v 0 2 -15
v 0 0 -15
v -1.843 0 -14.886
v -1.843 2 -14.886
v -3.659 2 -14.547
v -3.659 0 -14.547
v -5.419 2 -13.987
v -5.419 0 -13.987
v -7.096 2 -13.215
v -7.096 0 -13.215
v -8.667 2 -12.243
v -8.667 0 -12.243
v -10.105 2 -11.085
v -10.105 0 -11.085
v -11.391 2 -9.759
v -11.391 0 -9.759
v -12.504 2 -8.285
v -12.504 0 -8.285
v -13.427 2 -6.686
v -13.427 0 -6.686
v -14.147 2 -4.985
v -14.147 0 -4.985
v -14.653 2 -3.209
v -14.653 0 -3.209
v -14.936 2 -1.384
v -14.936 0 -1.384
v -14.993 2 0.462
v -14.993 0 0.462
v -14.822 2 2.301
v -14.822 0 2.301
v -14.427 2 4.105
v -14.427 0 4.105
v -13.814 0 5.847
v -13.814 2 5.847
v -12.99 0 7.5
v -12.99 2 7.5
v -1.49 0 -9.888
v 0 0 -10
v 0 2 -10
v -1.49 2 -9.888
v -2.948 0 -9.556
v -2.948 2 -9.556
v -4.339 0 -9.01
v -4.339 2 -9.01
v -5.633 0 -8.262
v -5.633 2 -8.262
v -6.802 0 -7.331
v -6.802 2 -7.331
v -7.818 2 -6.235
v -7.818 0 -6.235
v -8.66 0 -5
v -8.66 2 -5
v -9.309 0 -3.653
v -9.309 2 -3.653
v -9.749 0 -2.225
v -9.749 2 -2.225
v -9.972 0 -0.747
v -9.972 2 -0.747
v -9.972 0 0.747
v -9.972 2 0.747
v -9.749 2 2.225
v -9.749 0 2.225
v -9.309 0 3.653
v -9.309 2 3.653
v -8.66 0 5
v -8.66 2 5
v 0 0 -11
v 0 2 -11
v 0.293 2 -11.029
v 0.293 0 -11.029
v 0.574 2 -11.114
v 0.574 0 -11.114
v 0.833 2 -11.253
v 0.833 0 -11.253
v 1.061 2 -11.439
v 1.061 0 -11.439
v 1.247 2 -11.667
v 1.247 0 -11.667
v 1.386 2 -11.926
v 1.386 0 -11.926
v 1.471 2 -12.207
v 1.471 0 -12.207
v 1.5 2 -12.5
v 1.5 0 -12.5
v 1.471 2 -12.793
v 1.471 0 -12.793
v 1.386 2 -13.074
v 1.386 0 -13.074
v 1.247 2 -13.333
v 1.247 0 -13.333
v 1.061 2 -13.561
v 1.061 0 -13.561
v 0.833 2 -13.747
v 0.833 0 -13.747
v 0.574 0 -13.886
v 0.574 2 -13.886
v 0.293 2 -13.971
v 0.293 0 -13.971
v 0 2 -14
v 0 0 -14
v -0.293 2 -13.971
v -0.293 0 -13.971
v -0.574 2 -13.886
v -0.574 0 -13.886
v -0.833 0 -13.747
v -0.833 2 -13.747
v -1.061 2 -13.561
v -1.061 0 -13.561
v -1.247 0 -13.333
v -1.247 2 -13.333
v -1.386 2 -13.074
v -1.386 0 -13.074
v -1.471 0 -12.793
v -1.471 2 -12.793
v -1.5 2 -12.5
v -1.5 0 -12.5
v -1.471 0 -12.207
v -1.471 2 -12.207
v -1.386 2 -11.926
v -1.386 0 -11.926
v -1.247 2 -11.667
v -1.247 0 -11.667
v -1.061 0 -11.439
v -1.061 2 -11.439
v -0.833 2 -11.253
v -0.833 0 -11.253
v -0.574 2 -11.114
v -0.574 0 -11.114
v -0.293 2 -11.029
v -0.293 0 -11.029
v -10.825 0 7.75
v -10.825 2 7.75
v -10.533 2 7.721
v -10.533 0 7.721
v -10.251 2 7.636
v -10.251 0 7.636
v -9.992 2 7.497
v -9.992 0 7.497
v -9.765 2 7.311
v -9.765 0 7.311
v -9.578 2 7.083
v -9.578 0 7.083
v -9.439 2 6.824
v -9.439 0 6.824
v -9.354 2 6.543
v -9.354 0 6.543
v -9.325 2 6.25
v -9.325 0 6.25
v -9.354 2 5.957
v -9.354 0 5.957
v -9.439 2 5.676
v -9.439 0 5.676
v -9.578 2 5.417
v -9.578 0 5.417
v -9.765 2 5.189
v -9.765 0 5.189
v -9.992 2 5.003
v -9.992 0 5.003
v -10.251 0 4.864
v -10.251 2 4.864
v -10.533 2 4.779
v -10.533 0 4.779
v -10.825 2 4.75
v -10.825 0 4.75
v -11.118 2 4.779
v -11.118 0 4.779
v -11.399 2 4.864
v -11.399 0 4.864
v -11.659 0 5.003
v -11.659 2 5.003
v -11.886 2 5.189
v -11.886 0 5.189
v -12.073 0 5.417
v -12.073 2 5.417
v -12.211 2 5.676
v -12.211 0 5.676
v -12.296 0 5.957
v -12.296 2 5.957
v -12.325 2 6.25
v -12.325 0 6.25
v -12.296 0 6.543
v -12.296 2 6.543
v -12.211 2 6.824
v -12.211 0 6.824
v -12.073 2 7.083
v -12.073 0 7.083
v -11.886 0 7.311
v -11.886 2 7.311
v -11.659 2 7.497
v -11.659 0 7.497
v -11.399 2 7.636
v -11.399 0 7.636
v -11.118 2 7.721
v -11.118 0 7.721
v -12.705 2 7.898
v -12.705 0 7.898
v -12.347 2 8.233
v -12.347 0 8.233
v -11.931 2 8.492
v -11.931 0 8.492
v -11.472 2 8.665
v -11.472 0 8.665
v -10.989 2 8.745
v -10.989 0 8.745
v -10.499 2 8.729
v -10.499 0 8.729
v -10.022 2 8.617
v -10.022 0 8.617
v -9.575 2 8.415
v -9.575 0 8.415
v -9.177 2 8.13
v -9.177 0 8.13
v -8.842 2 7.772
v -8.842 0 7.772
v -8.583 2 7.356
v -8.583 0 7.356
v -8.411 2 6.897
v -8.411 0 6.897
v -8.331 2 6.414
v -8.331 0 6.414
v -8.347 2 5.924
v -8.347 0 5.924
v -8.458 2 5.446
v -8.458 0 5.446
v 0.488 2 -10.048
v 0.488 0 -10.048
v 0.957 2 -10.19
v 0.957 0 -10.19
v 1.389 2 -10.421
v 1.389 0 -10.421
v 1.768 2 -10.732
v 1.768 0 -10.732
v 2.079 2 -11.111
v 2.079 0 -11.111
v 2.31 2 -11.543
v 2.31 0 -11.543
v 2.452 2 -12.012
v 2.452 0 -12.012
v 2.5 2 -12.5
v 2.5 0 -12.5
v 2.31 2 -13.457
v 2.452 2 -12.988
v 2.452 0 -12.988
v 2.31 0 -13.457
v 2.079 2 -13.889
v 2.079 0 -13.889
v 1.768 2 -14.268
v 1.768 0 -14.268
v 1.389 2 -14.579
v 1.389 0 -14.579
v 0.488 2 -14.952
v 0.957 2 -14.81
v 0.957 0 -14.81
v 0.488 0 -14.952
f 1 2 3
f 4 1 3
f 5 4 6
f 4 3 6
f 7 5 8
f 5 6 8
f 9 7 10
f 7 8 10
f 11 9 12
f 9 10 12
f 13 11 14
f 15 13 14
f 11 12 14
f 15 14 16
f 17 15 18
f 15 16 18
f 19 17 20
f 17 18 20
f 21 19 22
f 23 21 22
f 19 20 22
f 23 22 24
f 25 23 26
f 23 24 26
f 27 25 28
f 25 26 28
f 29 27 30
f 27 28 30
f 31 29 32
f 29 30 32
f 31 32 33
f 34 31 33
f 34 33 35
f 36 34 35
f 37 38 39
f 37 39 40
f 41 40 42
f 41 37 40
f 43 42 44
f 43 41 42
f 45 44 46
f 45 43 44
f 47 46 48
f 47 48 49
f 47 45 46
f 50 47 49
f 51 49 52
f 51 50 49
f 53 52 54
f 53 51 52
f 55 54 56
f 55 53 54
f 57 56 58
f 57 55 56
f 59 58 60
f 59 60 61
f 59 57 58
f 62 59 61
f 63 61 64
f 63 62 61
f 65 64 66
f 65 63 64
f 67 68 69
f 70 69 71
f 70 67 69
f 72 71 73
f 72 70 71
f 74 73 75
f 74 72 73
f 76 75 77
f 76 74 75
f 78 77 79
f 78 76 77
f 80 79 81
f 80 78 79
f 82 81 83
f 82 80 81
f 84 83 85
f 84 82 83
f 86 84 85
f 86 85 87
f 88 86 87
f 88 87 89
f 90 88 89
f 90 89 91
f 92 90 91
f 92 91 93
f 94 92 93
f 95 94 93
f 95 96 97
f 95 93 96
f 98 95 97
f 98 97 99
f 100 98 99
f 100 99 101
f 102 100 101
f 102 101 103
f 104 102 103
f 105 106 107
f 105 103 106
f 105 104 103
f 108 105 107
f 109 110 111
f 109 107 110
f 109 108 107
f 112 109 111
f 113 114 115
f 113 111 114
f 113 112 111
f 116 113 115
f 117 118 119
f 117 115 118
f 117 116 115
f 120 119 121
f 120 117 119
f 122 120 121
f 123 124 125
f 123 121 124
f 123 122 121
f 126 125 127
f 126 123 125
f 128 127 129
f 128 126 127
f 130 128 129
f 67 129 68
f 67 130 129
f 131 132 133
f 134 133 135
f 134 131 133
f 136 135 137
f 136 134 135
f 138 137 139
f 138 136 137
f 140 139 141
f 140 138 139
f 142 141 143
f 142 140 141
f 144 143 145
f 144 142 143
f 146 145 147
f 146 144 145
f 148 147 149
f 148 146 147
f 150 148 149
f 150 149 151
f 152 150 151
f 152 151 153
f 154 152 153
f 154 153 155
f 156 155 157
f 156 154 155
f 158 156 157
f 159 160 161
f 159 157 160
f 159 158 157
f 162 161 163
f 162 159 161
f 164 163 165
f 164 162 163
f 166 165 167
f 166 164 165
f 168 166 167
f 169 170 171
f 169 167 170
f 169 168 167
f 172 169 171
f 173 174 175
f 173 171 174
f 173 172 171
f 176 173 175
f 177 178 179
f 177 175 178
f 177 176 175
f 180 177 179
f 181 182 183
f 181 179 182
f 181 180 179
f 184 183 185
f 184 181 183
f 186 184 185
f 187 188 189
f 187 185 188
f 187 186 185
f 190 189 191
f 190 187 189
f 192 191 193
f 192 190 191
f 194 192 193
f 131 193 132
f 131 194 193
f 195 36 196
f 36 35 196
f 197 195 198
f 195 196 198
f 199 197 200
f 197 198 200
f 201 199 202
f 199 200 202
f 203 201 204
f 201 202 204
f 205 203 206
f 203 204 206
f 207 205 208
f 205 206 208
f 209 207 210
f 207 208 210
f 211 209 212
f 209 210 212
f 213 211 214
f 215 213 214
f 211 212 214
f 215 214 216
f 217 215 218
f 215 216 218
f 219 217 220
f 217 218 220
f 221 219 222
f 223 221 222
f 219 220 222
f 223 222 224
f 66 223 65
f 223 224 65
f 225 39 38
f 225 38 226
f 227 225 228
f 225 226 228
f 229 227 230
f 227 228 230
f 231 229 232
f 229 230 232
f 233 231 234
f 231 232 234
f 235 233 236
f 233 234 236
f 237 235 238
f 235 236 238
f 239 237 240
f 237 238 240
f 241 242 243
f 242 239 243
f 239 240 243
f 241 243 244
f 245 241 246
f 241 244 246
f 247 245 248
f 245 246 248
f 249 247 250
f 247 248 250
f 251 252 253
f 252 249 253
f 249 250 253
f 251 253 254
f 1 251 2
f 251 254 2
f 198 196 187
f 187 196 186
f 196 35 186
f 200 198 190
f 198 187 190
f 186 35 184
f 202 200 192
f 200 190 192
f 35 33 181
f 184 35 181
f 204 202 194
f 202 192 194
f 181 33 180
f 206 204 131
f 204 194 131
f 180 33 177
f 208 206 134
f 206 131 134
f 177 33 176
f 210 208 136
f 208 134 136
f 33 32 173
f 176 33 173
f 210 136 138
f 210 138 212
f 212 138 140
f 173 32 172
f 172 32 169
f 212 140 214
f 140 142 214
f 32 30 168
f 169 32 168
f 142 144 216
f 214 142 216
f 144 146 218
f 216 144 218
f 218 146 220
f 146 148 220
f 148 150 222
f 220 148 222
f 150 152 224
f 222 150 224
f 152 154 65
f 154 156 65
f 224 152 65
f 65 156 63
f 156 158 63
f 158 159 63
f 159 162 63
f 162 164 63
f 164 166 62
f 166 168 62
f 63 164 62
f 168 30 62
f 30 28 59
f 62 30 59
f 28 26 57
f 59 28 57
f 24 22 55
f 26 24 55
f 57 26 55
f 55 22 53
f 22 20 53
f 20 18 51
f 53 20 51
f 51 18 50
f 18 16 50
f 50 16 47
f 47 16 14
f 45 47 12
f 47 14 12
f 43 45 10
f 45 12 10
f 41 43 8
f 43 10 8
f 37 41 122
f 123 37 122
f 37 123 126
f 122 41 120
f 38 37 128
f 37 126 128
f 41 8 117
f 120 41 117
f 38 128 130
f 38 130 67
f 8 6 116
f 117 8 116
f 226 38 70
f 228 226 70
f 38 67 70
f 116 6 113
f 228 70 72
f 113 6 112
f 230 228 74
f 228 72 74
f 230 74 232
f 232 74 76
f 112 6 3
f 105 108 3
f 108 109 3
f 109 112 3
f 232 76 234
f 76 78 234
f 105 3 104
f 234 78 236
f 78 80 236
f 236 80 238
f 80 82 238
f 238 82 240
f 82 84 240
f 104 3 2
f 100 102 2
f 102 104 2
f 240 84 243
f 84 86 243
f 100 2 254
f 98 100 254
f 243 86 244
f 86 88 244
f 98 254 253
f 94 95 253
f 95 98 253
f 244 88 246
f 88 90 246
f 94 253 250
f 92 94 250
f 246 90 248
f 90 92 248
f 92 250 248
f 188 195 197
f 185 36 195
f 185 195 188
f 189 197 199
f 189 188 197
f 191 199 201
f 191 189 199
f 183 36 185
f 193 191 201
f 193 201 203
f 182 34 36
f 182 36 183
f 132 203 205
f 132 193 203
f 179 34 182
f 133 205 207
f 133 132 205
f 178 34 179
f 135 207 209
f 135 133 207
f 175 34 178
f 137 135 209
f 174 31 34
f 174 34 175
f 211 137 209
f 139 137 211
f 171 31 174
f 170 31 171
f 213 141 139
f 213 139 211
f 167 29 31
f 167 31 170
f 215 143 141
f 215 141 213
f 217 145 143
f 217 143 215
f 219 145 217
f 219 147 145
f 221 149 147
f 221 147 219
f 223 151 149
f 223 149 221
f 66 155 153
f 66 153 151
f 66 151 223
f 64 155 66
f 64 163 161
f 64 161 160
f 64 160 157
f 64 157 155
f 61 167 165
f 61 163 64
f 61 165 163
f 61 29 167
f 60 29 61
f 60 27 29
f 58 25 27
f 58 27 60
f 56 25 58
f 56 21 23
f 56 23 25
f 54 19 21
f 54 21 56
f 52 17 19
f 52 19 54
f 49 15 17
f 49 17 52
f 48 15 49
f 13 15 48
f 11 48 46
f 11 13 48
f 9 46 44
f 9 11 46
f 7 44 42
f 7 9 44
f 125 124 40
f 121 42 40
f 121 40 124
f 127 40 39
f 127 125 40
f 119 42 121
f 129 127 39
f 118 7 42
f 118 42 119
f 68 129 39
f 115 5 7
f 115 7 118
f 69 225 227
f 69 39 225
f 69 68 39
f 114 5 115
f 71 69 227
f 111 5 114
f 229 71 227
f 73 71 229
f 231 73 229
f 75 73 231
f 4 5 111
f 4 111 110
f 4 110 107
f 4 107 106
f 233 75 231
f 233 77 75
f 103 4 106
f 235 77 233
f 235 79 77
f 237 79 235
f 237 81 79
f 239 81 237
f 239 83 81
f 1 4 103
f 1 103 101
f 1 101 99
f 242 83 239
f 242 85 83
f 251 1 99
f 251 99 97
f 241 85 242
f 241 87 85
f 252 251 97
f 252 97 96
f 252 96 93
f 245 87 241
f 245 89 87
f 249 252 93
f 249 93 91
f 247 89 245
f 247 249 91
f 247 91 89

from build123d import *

# Parameters (mm, degrees)
SKETCH2_R           = 15
SKETCH2_R_2         = 10
SKETCH2_R_3         = 1.5
BOSS_EXTRUDE3_DEPTH = 2
CUT_EXTRUDE1_DEPTH  = 2
BOSS_EXTRUDE4_START = -2
SKETCH5_R           = 2.5
SKETCH5_R_2         = 1.5
BOSS_EXTRUDE4_DEPTH = 2


with BuildPart() as part:
    # Sketch2 → Boss-Extrude3 (new body)
    with BuildSketch(Plane(origin=(0, 0, 0), x_dir=(1, 0, 0), z_dir=(0, 1, 0))):
        with Locations(Location((0, 0, 0), (0, 0, 270))):
            Circle(SKETCH2_R)
        with Locations(Location((0, 0, 0), (0, 0, 270))):
            Circle(SKETCH2_R_2, mode=Mode.SUBTRACT)
        with Locations(Location((0, 12.5, 0), (0, 0, 270))):
            Circle(SKETCH2_R_3, mode=Mode.SUBTRACT)
        with Locations(Location((10.825317547, -6.25, 0), (0, 0, 270))):
            Circle(SKETCH2_R_3, mode=Mode.SUBTRACT)
        with Locations(Location((-10.825317547, -6.25, 0), (0, 0, 270))):
            Circle(SKETCH2_R_3, mode=Mode.SUBTRACT)
    extrude(amount=BOSS_EXTRUDE3_DEPTH)

    # Sketch4 → Cut-Extrude1 (cut)
    with BuildSketch(Plane(origin=(0, 2, 0), x_dir=(1, 0, 0), z_dir=(0, 1, 0))):
        Polygon((0, -17.282816366), (0, 0), (-10.825317547, -6.25), (-3.247954002, -19.374378648), (-1.635577826, -22.167096106), (6.824242843, -17.282816366), align=None)
        Polygon((9.189739722, -15.917096106), (0, 0), (0, -17.282816366), (6.824242843, -17.282816366), align=None)
        Polygon((0, 15), (0, 0), (9.189739722, -15.917096106), (6.824242843, -17.282816366), (15, -17.282816366), (15, 15), align=None)
        Polygon((-3.247954002, -19.374378648), (-10.825317547, -6.25), (-12.990381057, -7.5), (-5.413017511, -20.624378648), align=None)
    extrude(amount=-CUT_EXTRUDE1_DEPTH, mode=Mode.SUBTRACT)

    # Sketch5 → Boss-Extrude4 (add)
    # profile 1 of 2: a face of its own
    with BuildSketch(Plane(origin=(0, 2, 0), x_dir=(1, 0, 0), z_dir=(0, 1, 0)).offset(BOSS_EXTRUDE4_START)):
        with Locations((0, 12.5)):
            Circle(SKETCH5_R)
        with Locations(Location((0, 12.5, 0), (0, 0, 270))):
            Circle(SKETCH5_R_2, mode=Mode.SUBTRACT)
    # profile 2 of 2: a face of its own
    with BuildSketch(Plane(origin=(0, 2, 0), x_dir=(1, 0, 0), z_dir=(0, 1, 0)).offset(BOSS_EXTRUDE4_START)):
        with Locations((-10.825317547, -6.25)):
            Circle(SKETCH5_R)
        with Locations(Location((-10.825317547, -6.25, 0), (0, 0, 270))):
            Circle(SKETCH5_R_2, mode=Mode.SUBTRACT)
    extrude(amount=BOSS_EXTRUDE4_DEPTH)


solid = part.part
